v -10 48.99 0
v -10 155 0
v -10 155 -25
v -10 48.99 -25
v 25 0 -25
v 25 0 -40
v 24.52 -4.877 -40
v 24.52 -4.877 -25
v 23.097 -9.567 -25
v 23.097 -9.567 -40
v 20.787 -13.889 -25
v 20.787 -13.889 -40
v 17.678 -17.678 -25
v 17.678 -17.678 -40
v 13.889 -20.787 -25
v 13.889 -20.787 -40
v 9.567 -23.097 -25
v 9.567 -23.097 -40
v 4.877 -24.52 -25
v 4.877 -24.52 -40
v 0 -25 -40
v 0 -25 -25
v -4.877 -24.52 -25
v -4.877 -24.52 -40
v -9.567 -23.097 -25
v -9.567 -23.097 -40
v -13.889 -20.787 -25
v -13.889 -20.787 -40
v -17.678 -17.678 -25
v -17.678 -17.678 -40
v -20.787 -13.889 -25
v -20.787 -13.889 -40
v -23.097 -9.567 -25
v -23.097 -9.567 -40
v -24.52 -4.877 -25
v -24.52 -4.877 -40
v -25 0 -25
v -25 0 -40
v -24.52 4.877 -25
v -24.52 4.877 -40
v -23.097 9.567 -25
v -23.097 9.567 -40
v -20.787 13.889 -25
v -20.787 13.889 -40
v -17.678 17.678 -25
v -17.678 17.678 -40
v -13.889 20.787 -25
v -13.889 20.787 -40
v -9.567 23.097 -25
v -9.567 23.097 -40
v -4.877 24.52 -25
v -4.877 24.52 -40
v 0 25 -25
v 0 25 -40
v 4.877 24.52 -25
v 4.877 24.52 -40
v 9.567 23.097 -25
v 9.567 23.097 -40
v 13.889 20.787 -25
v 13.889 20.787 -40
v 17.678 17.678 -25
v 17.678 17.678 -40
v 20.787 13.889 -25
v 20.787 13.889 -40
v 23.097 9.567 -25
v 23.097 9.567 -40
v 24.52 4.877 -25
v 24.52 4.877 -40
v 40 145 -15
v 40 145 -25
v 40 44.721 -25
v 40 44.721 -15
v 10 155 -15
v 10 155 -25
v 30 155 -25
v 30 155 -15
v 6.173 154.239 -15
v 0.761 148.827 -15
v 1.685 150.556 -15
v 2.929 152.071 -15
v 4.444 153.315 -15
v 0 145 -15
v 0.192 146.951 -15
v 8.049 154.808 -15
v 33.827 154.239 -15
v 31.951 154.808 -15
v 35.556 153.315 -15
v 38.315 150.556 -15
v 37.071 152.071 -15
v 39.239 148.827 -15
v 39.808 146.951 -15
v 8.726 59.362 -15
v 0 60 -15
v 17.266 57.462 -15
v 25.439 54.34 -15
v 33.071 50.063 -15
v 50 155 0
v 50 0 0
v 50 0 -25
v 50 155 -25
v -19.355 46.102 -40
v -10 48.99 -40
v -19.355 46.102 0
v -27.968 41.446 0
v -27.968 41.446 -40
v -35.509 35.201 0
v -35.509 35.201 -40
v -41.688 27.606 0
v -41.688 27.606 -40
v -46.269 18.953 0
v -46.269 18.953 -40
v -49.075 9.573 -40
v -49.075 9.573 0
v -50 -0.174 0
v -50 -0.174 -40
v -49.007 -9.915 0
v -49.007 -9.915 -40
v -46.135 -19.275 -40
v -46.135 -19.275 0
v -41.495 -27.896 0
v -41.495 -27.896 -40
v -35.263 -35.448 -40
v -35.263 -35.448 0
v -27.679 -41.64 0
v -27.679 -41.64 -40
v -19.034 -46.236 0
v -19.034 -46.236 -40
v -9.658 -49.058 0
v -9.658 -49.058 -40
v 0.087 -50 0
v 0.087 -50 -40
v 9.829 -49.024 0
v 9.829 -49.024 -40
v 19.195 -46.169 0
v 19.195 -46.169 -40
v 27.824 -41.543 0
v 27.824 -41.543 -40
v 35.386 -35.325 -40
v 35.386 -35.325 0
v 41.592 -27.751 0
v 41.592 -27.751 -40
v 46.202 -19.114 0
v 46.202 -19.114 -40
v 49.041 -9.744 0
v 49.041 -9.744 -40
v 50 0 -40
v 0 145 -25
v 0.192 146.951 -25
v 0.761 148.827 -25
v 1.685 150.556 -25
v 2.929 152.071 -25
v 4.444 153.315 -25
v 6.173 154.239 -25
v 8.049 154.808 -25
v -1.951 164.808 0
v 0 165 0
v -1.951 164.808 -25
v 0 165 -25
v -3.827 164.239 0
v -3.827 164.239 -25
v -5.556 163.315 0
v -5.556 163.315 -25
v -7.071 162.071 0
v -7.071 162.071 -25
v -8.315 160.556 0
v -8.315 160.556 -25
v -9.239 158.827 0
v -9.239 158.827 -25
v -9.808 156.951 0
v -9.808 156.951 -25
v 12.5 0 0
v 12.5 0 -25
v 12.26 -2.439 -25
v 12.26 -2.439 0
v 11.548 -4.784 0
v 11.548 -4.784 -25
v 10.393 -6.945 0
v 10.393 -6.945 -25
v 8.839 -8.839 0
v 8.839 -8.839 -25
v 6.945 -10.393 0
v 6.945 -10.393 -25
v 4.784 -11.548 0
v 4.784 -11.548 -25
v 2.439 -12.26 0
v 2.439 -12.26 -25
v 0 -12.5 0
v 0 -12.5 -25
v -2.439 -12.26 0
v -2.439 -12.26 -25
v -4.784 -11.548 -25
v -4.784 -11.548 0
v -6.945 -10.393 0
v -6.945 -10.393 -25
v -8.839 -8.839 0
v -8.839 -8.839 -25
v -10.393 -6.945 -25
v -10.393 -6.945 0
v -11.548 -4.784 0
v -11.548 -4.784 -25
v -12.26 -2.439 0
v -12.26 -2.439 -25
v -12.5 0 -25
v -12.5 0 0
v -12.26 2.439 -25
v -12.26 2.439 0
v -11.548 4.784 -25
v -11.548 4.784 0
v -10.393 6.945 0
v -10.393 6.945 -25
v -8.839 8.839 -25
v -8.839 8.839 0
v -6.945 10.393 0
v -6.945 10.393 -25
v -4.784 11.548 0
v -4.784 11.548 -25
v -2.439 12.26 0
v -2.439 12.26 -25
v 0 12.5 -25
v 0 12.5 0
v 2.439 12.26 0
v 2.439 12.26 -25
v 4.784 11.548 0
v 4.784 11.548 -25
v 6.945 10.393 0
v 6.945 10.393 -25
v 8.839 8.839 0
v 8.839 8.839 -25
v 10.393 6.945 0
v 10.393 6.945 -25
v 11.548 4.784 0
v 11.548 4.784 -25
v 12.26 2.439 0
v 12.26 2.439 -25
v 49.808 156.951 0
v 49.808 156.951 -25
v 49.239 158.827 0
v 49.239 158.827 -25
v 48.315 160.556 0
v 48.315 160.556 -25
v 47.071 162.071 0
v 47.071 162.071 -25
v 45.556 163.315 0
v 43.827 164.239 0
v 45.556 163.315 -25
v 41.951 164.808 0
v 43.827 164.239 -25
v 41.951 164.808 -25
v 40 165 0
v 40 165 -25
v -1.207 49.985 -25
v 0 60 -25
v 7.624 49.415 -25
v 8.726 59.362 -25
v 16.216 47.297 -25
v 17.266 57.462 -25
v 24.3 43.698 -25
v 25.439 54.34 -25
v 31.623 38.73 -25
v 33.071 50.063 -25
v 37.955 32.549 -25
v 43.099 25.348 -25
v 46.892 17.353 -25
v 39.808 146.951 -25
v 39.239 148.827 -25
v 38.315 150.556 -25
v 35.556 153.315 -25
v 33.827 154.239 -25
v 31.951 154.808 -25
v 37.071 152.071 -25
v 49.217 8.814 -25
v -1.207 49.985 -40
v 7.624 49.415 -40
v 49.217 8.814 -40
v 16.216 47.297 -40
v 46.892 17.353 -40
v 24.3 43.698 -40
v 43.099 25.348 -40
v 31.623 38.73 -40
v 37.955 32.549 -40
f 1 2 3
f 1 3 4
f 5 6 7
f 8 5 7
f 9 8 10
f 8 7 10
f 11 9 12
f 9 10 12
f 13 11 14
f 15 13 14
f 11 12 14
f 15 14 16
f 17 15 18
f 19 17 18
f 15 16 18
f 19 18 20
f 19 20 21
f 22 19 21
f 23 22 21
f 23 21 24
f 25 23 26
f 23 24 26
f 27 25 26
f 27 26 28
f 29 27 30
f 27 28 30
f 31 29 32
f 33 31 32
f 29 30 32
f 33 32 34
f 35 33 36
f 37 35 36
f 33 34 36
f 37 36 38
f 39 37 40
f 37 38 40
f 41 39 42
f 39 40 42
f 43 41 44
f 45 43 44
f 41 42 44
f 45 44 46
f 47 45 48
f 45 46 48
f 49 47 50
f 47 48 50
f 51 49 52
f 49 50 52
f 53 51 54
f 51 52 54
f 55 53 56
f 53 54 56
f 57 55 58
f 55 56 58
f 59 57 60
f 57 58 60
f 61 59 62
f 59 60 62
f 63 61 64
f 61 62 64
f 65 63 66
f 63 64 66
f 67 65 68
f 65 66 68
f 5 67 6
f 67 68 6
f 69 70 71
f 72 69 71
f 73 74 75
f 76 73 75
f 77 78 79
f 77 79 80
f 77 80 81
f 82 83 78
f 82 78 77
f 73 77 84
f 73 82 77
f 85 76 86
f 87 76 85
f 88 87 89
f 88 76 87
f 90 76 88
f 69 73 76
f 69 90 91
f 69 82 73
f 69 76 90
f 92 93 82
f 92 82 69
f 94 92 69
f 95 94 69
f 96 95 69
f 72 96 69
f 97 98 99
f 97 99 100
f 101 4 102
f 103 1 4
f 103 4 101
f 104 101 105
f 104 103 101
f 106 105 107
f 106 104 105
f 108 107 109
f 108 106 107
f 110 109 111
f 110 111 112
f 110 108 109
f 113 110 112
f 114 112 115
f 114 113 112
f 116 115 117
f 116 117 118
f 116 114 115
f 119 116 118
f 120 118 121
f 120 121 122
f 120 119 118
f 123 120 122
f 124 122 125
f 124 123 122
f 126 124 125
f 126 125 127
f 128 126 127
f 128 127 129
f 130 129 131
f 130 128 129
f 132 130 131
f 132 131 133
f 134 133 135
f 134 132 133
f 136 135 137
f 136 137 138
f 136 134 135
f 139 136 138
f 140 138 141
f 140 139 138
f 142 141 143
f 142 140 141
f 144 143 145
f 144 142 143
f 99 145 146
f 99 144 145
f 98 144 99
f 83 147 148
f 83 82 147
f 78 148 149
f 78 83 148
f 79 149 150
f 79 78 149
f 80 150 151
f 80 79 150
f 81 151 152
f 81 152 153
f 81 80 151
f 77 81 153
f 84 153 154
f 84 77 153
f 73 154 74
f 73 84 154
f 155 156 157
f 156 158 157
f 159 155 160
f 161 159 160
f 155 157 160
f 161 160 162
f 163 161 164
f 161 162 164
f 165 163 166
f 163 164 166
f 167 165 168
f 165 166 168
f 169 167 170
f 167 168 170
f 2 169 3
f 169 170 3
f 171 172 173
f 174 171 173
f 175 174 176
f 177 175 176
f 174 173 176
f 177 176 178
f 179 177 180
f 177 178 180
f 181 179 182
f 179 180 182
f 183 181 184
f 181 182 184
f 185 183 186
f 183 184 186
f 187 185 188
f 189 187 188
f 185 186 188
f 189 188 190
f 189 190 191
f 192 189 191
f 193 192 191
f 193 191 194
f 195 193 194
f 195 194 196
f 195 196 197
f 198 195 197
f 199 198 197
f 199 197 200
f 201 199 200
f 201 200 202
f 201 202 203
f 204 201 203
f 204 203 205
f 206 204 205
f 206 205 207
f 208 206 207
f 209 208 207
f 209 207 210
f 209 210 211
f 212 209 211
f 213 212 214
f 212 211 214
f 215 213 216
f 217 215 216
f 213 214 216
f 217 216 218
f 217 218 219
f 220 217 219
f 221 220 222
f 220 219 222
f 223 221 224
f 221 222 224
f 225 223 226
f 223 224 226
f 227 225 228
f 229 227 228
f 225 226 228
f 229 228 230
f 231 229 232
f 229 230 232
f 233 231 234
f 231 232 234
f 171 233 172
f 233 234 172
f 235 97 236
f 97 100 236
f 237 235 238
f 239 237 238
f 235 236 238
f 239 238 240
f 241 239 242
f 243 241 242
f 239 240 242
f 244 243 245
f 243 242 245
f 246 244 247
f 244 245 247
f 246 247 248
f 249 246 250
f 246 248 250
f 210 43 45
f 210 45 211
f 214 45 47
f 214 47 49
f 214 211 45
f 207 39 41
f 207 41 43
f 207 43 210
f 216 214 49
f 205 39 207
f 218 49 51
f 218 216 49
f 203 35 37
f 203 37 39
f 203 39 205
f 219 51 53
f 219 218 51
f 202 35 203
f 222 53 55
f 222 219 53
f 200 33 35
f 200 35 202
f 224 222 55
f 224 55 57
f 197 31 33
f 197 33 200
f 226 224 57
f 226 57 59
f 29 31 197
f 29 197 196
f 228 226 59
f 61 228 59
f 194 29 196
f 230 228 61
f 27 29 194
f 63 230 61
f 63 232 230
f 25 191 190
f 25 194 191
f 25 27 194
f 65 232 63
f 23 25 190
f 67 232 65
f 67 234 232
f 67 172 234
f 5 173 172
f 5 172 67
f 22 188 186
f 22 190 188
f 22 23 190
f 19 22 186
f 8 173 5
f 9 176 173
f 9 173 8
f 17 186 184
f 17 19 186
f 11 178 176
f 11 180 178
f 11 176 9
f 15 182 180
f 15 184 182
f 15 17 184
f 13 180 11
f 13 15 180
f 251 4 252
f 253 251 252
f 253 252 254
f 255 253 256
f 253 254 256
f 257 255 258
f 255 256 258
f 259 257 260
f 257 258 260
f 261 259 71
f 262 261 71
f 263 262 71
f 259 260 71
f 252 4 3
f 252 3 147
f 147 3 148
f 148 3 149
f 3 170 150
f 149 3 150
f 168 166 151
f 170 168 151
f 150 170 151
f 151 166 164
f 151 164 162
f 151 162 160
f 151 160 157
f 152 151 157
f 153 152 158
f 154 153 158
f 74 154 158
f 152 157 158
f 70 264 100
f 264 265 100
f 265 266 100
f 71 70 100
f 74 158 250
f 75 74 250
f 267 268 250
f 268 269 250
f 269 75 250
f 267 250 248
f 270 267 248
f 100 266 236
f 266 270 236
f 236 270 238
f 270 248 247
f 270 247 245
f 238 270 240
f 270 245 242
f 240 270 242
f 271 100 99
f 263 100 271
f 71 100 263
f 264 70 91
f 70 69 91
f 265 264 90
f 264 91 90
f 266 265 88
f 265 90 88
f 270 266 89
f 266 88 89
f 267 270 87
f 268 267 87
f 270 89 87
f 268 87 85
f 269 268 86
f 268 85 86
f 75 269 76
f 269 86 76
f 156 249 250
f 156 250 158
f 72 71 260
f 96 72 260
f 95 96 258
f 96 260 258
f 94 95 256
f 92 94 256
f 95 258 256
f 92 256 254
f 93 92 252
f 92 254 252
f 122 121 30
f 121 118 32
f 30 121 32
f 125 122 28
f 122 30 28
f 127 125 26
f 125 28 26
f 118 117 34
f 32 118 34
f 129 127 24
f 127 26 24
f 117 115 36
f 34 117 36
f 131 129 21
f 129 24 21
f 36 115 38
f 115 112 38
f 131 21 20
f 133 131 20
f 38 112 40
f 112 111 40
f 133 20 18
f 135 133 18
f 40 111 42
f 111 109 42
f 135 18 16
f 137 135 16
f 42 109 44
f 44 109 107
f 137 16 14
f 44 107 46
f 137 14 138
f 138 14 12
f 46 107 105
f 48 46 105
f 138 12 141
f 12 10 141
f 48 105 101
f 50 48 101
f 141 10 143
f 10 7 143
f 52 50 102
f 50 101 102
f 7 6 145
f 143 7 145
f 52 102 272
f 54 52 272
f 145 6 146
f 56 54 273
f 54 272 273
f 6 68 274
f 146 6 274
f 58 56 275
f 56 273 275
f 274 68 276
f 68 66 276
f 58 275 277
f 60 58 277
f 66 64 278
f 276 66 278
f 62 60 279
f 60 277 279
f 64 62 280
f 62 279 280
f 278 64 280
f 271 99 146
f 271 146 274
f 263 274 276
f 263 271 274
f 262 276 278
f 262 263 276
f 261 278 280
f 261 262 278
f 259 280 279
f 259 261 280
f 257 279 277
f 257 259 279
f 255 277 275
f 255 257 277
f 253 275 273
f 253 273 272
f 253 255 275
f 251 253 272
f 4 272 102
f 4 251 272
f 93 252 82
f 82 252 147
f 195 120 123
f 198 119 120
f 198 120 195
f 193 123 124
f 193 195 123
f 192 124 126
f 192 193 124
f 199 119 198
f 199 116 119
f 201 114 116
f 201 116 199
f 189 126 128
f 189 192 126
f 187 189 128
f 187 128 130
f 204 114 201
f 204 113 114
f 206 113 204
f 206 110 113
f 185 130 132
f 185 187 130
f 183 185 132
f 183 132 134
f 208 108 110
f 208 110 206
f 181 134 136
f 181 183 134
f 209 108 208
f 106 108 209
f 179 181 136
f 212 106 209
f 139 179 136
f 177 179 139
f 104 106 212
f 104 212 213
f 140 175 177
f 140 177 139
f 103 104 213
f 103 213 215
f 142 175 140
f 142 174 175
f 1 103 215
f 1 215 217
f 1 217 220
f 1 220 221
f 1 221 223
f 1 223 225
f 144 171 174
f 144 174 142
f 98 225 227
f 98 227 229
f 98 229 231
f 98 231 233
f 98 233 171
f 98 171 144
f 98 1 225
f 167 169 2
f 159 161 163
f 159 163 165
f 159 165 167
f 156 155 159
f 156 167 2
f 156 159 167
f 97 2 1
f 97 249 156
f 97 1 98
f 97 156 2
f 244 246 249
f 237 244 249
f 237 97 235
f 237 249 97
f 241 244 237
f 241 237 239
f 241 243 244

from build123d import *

# Parameters (mm, degrees)
F1_DEPTH = 25
F2_DEPTH = 40
F3_R     = 12.5
F4_DEPTH = 40.001
F5_R     = 25
F6_DEPTH = 15
F7_R     = 10
F9_DEPTH = 10
F10_R    = 10


with BuildPart() as f1:
    # F0 (on Top) → F1 (new body)
    with BuildSketch(Plane.XY):
        with BuildLine():
            ThreePointArc((-10, 48.989795), (31.622777, 38.729833), (50, 0))
            Line((50, 0), (50, 165))
            Line((50, 165), (-10, 165))
            Line((-10, 165), (-10, 48.989795))
        make_face()
    extrude(amount=-F1_DEPTH)

    # F0 (on Top) → F2 (join)
    with BuildSketch(Plane.XY):
        with BuildLine():
            Line((-10, 0), (50, 0))
            ThreePointArc((50, 0), (31.622777, 38.729833), (-10, 48.989795))
            Line((-10, 48.989795), (-10, 0))
        make_face()
        with BuildLine():
            ThreePointArc((-10, 48.989795), (-31.622777, -38.729833), (50, 0))
            Line((50, 0), (-10, 0))
            Line((-10, 0), (-10, 48.989795))
        make_face()
    extrude(amount=-F2_DEPTH)

    # F3 (on face) → F4 (cut, through all)
    with BuildSketch(Plane(origin=(0, 0, -40), x_dir=(1, 0, 0), z_dir=(0, 0, -1))):
        Circle(F3_R)
    extrude(amount=-F4_DEPTH, mode=Mode.SUBTRACT)

    # F5 (on face) → F6 (cut)
    with BuildSketch(Plane(origin=(0, 0, -40), x_dir=(1, 0, 0), z_dir=(0, 0, -1))):
        Circle(F5_R)
    extrude(amount=-F6_DEPTH, mode=Mode.SUBTRACT)

    # F7
    f7_edges = [f1.edges().sort_by_distance(p)[0] for p in [
        (-10, 165, -12.5),
        (50, 165, -12.5),
    ]]
    fillet(f7_edges, radius=F7_R)

    # F8 (on face) → F9 (cut)
    with BuildSketch(Plane(origin=(0, 0, -25), x_dir=(1, 0, 0), z_dir=(0, 0, -1))):
        with BuildLine():
            Line((0, -155), (40, -155))
            Line((40, -155), (40, -44.72136))
            ThreePointArc((40, -44.72136), (21.409325, -56.050342), (0, -60))
            Line((0, -60), (0, -155))
        make_face()
    extrude(amount=-F9_DEPTH, mode=Mode.SUBTRACT)

    # F10
    f10_edges = [f1.edges().sort_by_distance(p)[0] for p in [
        (0, 155, -20),
        (40, 155, -20),
    ]]
    fillet(f10_edges, radius=F10_R)


solid = f1.part
